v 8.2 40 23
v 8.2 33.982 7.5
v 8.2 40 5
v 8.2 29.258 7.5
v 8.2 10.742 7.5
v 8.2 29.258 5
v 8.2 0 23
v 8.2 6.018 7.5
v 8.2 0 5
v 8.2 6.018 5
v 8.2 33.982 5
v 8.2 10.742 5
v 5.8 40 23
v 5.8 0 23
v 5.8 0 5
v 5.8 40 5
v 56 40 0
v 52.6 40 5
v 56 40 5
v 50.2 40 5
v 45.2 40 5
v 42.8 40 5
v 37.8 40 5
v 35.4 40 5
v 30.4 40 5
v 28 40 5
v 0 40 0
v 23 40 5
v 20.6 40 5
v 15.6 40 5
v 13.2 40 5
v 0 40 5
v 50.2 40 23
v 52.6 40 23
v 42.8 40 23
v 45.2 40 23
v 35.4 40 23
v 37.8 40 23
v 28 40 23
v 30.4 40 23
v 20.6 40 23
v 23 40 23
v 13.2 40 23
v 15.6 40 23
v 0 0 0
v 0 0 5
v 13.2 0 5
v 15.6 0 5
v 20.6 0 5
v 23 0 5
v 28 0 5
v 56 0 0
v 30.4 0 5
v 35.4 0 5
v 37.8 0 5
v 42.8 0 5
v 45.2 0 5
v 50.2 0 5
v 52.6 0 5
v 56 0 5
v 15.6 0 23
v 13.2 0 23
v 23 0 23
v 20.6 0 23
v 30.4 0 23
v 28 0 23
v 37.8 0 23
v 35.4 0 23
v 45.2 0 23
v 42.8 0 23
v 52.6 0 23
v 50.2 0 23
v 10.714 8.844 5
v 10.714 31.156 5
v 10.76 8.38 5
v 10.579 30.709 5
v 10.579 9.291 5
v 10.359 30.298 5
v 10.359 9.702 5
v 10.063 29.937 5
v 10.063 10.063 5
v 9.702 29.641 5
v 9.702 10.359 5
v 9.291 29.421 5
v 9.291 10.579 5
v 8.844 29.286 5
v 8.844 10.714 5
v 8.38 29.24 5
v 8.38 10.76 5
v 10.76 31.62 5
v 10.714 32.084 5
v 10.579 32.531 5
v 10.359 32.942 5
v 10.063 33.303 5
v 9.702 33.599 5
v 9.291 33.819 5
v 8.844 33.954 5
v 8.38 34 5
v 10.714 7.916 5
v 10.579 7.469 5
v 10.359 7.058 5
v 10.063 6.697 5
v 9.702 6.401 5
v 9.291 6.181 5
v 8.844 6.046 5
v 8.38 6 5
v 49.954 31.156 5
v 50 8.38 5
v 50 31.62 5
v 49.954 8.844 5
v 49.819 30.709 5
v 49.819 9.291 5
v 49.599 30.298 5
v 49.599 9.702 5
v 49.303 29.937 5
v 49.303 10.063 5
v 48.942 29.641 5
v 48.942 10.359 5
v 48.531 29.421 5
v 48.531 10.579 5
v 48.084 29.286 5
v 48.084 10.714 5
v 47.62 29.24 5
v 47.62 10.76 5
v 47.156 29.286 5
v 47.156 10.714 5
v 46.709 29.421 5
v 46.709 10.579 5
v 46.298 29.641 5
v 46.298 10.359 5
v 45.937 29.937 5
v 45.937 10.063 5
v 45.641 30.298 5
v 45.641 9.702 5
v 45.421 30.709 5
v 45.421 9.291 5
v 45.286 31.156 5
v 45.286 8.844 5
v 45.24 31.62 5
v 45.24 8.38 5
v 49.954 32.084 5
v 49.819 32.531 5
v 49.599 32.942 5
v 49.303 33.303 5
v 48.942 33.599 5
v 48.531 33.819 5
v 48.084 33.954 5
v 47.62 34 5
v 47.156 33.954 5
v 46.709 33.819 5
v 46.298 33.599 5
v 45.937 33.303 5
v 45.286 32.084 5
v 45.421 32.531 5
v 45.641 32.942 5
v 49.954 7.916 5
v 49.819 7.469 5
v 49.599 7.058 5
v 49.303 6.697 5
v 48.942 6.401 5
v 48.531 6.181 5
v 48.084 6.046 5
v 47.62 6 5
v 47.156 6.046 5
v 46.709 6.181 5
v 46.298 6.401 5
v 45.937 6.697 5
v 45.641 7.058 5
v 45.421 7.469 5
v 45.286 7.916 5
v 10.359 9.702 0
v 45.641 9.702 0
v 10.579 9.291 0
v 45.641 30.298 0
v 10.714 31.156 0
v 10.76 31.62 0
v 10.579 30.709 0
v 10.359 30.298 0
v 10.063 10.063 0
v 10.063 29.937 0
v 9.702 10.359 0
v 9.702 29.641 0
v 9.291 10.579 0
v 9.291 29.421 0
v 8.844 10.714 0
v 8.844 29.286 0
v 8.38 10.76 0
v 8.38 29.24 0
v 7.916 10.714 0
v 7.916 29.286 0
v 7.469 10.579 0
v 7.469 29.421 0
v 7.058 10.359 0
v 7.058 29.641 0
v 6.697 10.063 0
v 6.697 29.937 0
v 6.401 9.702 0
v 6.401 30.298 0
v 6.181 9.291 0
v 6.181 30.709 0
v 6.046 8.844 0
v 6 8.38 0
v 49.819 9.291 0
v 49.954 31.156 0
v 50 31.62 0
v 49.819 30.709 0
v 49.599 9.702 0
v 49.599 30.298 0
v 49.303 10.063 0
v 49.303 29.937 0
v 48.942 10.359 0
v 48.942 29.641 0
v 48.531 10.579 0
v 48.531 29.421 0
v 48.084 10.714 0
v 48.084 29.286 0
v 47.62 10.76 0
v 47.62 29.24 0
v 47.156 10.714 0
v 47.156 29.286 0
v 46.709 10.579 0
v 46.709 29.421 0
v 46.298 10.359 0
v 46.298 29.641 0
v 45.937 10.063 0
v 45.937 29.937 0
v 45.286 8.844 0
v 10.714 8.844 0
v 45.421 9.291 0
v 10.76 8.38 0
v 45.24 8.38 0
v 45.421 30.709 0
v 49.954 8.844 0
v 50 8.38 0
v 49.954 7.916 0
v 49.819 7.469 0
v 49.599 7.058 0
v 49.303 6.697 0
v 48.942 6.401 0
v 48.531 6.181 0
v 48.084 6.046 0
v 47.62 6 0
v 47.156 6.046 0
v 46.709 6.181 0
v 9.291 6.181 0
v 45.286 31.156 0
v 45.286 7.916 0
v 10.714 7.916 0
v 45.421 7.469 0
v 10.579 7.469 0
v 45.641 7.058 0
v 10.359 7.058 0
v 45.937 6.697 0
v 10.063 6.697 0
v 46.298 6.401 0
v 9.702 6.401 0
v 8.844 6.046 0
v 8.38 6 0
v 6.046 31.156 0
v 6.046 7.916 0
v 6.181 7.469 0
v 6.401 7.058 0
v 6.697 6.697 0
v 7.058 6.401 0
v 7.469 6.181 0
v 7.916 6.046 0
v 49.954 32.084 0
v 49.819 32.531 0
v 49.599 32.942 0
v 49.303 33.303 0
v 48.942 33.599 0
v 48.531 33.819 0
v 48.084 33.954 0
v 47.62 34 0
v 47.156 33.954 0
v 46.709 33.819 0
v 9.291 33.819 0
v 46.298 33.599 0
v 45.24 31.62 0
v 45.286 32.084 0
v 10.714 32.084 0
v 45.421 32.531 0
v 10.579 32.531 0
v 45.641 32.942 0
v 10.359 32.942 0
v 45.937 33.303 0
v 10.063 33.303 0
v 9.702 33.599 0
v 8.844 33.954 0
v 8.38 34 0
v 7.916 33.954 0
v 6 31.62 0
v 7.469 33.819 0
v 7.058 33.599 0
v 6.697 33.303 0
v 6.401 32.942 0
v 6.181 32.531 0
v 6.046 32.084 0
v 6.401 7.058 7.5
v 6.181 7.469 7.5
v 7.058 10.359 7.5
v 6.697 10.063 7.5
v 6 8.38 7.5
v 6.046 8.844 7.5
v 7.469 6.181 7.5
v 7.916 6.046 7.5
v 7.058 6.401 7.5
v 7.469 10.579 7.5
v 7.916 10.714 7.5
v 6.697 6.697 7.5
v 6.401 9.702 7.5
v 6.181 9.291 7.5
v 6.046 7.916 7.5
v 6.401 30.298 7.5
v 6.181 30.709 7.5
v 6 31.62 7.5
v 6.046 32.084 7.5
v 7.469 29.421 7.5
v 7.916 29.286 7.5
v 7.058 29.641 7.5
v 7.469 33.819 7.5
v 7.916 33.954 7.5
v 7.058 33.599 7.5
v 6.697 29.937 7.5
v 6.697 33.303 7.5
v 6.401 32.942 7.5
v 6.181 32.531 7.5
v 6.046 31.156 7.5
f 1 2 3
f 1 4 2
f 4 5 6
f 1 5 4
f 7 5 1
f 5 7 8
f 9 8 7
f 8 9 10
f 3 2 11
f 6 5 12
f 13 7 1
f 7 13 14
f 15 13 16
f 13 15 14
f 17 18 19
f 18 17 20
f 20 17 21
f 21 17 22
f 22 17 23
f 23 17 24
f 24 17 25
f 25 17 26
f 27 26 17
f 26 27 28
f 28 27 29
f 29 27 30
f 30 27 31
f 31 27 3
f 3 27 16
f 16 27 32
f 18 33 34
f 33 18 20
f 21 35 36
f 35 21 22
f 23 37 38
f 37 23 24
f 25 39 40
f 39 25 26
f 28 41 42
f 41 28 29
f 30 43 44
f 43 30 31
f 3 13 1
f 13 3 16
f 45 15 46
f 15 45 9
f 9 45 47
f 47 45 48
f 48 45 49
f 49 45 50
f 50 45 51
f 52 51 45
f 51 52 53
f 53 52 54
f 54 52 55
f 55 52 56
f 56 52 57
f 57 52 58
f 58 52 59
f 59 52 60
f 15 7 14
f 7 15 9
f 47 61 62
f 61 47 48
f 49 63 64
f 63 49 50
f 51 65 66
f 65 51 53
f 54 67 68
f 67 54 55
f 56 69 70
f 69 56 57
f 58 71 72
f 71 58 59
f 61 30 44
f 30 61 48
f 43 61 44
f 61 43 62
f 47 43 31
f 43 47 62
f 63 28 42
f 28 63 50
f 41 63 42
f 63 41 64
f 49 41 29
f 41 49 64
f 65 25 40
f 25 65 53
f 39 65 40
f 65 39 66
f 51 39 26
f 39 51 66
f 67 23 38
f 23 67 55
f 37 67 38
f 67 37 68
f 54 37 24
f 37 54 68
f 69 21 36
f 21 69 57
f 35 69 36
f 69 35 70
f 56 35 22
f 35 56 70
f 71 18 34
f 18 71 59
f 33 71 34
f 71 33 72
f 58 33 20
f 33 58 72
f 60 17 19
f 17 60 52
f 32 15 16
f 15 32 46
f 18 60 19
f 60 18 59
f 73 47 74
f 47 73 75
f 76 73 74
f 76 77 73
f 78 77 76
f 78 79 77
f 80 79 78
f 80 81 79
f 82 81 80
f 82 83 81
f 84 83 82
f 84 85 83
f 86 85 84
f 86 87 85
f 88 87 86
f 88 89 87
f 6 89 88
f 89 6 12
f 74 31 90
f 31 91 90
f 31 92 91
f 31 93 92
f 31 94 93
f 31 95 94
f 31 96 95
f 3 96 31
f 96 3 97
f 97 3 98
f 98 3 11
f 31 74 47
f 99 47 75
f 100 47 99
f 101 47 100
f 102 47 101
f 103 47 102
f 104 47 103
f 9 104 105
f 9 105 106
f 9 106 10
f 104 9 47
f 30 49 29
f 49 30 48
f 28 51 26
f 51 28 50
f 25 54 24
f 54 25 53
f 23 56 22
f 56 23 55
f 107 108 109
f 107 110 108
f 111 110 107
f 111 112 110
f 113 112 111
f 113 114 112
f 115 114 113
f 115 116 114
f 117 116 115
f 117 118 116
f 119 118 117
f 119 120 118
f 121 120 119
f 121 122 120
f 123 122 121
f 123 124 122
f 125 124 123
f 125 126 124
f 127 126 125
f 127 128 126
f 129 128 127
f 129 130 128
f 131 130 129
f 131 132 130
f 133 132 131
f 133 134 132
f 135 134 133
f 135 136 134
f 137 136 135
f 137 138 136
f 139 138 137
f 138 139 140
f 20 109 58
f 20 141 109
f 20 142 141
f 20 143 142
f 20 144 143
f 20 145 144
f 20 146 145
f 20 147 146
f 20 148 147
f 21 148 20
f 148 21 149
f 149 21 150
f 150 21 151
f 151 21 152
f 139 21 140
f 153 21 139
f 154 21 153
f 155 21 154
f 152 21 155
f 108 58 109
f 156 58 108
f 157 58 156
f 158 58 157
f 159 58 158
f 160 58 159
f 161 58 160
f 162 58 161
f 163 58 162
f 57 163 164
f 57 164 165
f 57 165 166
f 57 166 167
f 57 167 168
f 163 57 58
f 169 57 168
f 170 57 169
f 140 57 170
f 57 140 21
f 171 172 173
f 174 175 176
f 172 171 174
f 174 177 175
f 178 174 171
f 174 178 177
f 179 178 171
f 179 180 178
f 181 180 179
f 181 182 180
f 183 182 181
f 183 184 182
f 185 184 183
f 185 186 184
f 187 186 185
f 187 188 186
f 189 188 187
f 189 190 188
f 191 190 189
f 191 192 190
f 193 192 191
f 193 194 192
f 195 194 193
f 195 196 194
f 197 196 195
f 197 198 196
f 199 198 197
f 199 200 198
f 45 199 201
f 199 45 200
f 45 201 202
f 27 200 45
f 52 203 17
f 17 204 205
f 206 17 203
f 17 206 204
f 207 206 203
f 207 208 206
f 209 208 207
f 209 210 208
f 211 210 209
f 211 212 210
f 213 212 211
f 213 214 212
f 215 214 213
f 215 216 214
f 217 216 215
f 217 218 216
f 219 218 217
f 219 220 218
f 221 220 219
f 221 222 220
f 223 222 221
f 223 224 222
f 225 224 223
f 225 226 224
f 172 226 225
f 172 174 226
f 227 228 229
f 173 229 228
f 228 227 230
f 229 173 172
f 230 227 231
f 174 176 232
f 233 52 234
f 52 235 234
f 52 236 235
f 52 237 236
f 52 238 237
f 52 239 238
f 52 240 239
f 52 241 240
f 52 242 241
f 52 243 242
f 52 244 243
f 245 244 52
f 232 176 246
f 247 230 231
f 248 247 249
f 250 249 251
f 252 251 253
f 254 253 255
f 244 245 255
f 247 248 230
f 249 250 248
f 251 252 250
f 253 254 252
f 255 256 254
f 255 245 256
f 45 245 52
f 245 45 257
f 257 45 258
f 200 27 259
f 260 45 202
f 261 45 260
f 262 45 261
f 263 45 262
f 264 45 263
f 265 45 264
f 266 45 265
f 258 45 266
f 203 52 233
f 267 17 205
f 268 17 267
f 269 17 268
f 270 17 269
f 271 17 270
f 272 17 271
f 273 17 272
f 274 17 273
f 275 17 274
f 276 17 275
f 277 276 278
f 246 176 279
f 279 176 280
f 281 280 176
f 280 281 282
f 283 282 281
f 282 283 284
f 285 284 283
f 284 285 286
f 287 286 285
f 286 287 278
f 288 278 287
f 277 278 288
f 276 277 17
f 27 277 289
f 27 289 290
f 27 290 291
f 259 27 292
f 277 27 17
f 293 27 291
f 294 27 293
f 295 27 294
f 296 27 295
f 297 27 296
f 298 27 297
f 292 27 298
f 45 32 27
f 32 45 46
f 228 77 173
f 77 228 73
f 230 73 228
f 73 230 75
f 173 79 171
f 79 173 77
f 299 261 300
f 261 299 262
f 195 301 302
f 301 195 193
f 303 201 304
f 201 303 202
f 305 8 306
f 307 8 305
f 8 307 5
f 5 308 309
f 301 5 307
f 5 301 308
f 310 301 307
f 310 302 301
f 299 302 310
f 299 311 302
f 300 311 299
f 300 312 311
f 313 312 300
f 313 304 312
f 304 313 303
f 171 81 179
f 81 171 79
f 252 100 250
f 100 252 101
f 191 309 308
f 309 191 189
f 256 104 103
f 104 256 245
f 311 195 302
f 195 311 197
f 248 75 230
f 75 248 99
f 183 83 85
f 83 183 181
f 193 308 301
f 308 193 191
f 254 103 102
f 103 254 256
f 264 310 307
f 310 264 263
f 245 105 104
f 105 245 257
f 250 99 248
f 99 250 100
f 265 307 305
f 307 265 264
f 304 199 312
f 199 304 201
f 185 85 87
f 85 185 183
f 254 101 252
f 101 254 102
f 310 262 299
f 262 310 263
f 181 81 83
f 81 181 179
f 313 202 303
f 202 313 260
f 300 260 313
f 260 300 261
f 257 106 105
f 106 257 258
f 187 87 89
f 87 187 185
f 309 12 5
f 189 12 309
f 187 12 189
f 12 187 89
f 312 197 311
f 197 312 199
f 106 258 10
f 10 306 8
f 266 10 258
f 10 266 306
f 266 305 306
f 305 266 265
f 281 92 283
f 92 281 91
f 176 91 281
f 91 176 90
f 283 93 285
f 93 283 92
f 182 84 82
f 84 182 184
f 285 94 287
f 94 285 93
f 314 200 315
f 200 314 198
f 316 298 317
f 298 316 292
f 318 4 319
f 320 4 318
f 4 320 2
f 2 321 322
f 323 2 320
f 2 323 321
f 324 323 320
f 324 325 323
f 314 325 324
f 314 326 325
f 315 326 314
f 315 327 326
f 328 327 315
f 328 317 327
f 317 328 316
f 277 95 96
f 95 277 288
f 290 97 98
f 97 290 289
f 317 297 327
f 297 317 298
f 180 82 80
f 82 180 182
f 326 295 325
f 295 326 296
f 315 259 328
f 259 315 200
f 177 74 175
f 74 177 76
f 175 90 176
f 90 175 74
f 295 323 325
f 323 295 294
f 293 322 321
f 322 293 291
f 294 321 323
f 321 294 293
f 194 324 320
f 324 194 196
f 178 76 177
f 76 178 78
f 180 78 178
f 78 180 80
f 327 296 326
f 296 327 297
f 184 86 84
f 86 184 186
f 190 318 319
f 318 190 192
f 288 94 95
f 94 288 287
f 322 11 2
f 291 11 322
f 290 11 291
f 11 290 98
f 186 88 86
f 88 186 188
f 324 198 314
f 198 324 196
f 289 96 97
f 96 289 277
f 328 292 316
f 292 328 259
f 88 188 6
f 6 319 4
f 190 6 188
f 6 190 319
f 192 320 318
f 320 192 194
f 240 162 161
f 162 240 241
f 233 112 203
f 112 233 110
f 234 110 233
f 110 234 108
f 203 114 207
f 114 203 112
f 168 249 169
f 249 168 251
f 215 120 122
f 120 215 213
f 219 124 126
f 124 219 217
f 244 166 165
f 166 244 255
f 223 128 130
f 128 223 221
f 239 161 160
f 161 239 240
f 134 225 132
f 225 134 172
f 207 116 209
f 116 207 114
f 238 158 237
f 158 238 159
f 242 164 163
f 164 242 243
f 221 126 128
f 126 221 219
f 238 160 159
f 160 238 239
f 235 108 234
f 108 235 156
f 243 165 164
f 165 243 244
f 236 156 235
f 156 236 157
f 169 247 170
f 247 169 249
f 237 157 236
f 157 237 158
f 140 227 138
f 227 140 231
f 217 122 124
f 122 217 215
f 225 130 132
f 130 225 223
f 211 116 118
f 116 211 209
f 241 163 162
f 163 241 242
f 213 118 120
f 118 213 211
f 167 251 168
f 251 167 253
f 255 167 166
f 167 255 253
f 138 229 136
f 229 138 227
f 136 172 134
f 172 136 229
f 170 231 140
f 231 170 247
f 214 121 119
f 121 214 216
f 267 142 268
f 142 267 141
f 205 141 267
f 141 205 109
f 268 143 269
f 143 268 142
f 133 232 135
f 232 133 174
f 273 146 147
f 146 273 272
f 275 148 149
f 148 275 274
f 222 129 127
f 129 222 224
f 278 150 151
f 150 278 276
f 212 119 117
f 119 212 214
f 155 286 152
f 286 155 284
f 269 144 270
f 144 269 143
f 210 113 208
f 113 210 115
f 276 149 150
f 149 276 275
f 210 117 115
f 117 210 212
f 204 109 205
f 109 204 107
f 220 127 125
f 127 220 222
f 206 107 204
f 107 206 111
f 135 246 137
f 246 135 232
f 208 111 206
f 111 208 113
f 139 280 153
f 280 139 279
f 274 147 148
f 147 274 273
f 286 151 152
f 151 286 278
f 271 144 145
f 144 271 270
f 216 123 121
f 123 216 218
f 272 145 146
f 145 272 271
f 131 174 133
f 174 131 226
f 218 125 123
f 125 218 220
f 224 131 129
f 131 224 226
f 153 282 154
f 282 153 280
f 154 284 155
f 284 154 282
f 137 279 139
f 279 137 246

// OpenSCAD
$fn = 32;

// ----------------------------------------------------------------------
// Finned heat sink: 56 x 40 mm base, 18 mm fins
// ----------------------------------------------------------------------

// --- parameters (mm) ---
base_w = 56;              // base width
base_d = 40;              // base depth
base_t = 5;               // base thickness
fin_h = 18;               // fin height above the base
holes_d = 4.76;           // fixing holes
hole_x = 19.62;           // hole offset in x
hole_y = 11.62;           // hole offset in y
fin_t = 2.4;              // fin thickness
fin_pitch = 7.4;          // fin pitch
fin_count = 7;            // number of fins
fin_x0 = 5.8;             // first fin offset

difference() {
  union() {
    cube([base_w, base_d, base_t]);
    for (i = [0 : fin_count - 1]) {
      translate([fin_x0 + i * fin_pitch, 0, base_t - 0.5]) cube([fin_t, base_d, fin_h + 0.5]);
    }
  }
  /* fixing holes through the base, 2.5 mm clear on both sides */
  for (hx = [-19.62, 19.62]) {
    for (hy = [-11.62, 11.62]) {
      translate([base_w / 2 + hx, base_d / 2 + hy, -2.5]) cylinder(h = base_t + 5, d = holes_d);
    }
  }
}
